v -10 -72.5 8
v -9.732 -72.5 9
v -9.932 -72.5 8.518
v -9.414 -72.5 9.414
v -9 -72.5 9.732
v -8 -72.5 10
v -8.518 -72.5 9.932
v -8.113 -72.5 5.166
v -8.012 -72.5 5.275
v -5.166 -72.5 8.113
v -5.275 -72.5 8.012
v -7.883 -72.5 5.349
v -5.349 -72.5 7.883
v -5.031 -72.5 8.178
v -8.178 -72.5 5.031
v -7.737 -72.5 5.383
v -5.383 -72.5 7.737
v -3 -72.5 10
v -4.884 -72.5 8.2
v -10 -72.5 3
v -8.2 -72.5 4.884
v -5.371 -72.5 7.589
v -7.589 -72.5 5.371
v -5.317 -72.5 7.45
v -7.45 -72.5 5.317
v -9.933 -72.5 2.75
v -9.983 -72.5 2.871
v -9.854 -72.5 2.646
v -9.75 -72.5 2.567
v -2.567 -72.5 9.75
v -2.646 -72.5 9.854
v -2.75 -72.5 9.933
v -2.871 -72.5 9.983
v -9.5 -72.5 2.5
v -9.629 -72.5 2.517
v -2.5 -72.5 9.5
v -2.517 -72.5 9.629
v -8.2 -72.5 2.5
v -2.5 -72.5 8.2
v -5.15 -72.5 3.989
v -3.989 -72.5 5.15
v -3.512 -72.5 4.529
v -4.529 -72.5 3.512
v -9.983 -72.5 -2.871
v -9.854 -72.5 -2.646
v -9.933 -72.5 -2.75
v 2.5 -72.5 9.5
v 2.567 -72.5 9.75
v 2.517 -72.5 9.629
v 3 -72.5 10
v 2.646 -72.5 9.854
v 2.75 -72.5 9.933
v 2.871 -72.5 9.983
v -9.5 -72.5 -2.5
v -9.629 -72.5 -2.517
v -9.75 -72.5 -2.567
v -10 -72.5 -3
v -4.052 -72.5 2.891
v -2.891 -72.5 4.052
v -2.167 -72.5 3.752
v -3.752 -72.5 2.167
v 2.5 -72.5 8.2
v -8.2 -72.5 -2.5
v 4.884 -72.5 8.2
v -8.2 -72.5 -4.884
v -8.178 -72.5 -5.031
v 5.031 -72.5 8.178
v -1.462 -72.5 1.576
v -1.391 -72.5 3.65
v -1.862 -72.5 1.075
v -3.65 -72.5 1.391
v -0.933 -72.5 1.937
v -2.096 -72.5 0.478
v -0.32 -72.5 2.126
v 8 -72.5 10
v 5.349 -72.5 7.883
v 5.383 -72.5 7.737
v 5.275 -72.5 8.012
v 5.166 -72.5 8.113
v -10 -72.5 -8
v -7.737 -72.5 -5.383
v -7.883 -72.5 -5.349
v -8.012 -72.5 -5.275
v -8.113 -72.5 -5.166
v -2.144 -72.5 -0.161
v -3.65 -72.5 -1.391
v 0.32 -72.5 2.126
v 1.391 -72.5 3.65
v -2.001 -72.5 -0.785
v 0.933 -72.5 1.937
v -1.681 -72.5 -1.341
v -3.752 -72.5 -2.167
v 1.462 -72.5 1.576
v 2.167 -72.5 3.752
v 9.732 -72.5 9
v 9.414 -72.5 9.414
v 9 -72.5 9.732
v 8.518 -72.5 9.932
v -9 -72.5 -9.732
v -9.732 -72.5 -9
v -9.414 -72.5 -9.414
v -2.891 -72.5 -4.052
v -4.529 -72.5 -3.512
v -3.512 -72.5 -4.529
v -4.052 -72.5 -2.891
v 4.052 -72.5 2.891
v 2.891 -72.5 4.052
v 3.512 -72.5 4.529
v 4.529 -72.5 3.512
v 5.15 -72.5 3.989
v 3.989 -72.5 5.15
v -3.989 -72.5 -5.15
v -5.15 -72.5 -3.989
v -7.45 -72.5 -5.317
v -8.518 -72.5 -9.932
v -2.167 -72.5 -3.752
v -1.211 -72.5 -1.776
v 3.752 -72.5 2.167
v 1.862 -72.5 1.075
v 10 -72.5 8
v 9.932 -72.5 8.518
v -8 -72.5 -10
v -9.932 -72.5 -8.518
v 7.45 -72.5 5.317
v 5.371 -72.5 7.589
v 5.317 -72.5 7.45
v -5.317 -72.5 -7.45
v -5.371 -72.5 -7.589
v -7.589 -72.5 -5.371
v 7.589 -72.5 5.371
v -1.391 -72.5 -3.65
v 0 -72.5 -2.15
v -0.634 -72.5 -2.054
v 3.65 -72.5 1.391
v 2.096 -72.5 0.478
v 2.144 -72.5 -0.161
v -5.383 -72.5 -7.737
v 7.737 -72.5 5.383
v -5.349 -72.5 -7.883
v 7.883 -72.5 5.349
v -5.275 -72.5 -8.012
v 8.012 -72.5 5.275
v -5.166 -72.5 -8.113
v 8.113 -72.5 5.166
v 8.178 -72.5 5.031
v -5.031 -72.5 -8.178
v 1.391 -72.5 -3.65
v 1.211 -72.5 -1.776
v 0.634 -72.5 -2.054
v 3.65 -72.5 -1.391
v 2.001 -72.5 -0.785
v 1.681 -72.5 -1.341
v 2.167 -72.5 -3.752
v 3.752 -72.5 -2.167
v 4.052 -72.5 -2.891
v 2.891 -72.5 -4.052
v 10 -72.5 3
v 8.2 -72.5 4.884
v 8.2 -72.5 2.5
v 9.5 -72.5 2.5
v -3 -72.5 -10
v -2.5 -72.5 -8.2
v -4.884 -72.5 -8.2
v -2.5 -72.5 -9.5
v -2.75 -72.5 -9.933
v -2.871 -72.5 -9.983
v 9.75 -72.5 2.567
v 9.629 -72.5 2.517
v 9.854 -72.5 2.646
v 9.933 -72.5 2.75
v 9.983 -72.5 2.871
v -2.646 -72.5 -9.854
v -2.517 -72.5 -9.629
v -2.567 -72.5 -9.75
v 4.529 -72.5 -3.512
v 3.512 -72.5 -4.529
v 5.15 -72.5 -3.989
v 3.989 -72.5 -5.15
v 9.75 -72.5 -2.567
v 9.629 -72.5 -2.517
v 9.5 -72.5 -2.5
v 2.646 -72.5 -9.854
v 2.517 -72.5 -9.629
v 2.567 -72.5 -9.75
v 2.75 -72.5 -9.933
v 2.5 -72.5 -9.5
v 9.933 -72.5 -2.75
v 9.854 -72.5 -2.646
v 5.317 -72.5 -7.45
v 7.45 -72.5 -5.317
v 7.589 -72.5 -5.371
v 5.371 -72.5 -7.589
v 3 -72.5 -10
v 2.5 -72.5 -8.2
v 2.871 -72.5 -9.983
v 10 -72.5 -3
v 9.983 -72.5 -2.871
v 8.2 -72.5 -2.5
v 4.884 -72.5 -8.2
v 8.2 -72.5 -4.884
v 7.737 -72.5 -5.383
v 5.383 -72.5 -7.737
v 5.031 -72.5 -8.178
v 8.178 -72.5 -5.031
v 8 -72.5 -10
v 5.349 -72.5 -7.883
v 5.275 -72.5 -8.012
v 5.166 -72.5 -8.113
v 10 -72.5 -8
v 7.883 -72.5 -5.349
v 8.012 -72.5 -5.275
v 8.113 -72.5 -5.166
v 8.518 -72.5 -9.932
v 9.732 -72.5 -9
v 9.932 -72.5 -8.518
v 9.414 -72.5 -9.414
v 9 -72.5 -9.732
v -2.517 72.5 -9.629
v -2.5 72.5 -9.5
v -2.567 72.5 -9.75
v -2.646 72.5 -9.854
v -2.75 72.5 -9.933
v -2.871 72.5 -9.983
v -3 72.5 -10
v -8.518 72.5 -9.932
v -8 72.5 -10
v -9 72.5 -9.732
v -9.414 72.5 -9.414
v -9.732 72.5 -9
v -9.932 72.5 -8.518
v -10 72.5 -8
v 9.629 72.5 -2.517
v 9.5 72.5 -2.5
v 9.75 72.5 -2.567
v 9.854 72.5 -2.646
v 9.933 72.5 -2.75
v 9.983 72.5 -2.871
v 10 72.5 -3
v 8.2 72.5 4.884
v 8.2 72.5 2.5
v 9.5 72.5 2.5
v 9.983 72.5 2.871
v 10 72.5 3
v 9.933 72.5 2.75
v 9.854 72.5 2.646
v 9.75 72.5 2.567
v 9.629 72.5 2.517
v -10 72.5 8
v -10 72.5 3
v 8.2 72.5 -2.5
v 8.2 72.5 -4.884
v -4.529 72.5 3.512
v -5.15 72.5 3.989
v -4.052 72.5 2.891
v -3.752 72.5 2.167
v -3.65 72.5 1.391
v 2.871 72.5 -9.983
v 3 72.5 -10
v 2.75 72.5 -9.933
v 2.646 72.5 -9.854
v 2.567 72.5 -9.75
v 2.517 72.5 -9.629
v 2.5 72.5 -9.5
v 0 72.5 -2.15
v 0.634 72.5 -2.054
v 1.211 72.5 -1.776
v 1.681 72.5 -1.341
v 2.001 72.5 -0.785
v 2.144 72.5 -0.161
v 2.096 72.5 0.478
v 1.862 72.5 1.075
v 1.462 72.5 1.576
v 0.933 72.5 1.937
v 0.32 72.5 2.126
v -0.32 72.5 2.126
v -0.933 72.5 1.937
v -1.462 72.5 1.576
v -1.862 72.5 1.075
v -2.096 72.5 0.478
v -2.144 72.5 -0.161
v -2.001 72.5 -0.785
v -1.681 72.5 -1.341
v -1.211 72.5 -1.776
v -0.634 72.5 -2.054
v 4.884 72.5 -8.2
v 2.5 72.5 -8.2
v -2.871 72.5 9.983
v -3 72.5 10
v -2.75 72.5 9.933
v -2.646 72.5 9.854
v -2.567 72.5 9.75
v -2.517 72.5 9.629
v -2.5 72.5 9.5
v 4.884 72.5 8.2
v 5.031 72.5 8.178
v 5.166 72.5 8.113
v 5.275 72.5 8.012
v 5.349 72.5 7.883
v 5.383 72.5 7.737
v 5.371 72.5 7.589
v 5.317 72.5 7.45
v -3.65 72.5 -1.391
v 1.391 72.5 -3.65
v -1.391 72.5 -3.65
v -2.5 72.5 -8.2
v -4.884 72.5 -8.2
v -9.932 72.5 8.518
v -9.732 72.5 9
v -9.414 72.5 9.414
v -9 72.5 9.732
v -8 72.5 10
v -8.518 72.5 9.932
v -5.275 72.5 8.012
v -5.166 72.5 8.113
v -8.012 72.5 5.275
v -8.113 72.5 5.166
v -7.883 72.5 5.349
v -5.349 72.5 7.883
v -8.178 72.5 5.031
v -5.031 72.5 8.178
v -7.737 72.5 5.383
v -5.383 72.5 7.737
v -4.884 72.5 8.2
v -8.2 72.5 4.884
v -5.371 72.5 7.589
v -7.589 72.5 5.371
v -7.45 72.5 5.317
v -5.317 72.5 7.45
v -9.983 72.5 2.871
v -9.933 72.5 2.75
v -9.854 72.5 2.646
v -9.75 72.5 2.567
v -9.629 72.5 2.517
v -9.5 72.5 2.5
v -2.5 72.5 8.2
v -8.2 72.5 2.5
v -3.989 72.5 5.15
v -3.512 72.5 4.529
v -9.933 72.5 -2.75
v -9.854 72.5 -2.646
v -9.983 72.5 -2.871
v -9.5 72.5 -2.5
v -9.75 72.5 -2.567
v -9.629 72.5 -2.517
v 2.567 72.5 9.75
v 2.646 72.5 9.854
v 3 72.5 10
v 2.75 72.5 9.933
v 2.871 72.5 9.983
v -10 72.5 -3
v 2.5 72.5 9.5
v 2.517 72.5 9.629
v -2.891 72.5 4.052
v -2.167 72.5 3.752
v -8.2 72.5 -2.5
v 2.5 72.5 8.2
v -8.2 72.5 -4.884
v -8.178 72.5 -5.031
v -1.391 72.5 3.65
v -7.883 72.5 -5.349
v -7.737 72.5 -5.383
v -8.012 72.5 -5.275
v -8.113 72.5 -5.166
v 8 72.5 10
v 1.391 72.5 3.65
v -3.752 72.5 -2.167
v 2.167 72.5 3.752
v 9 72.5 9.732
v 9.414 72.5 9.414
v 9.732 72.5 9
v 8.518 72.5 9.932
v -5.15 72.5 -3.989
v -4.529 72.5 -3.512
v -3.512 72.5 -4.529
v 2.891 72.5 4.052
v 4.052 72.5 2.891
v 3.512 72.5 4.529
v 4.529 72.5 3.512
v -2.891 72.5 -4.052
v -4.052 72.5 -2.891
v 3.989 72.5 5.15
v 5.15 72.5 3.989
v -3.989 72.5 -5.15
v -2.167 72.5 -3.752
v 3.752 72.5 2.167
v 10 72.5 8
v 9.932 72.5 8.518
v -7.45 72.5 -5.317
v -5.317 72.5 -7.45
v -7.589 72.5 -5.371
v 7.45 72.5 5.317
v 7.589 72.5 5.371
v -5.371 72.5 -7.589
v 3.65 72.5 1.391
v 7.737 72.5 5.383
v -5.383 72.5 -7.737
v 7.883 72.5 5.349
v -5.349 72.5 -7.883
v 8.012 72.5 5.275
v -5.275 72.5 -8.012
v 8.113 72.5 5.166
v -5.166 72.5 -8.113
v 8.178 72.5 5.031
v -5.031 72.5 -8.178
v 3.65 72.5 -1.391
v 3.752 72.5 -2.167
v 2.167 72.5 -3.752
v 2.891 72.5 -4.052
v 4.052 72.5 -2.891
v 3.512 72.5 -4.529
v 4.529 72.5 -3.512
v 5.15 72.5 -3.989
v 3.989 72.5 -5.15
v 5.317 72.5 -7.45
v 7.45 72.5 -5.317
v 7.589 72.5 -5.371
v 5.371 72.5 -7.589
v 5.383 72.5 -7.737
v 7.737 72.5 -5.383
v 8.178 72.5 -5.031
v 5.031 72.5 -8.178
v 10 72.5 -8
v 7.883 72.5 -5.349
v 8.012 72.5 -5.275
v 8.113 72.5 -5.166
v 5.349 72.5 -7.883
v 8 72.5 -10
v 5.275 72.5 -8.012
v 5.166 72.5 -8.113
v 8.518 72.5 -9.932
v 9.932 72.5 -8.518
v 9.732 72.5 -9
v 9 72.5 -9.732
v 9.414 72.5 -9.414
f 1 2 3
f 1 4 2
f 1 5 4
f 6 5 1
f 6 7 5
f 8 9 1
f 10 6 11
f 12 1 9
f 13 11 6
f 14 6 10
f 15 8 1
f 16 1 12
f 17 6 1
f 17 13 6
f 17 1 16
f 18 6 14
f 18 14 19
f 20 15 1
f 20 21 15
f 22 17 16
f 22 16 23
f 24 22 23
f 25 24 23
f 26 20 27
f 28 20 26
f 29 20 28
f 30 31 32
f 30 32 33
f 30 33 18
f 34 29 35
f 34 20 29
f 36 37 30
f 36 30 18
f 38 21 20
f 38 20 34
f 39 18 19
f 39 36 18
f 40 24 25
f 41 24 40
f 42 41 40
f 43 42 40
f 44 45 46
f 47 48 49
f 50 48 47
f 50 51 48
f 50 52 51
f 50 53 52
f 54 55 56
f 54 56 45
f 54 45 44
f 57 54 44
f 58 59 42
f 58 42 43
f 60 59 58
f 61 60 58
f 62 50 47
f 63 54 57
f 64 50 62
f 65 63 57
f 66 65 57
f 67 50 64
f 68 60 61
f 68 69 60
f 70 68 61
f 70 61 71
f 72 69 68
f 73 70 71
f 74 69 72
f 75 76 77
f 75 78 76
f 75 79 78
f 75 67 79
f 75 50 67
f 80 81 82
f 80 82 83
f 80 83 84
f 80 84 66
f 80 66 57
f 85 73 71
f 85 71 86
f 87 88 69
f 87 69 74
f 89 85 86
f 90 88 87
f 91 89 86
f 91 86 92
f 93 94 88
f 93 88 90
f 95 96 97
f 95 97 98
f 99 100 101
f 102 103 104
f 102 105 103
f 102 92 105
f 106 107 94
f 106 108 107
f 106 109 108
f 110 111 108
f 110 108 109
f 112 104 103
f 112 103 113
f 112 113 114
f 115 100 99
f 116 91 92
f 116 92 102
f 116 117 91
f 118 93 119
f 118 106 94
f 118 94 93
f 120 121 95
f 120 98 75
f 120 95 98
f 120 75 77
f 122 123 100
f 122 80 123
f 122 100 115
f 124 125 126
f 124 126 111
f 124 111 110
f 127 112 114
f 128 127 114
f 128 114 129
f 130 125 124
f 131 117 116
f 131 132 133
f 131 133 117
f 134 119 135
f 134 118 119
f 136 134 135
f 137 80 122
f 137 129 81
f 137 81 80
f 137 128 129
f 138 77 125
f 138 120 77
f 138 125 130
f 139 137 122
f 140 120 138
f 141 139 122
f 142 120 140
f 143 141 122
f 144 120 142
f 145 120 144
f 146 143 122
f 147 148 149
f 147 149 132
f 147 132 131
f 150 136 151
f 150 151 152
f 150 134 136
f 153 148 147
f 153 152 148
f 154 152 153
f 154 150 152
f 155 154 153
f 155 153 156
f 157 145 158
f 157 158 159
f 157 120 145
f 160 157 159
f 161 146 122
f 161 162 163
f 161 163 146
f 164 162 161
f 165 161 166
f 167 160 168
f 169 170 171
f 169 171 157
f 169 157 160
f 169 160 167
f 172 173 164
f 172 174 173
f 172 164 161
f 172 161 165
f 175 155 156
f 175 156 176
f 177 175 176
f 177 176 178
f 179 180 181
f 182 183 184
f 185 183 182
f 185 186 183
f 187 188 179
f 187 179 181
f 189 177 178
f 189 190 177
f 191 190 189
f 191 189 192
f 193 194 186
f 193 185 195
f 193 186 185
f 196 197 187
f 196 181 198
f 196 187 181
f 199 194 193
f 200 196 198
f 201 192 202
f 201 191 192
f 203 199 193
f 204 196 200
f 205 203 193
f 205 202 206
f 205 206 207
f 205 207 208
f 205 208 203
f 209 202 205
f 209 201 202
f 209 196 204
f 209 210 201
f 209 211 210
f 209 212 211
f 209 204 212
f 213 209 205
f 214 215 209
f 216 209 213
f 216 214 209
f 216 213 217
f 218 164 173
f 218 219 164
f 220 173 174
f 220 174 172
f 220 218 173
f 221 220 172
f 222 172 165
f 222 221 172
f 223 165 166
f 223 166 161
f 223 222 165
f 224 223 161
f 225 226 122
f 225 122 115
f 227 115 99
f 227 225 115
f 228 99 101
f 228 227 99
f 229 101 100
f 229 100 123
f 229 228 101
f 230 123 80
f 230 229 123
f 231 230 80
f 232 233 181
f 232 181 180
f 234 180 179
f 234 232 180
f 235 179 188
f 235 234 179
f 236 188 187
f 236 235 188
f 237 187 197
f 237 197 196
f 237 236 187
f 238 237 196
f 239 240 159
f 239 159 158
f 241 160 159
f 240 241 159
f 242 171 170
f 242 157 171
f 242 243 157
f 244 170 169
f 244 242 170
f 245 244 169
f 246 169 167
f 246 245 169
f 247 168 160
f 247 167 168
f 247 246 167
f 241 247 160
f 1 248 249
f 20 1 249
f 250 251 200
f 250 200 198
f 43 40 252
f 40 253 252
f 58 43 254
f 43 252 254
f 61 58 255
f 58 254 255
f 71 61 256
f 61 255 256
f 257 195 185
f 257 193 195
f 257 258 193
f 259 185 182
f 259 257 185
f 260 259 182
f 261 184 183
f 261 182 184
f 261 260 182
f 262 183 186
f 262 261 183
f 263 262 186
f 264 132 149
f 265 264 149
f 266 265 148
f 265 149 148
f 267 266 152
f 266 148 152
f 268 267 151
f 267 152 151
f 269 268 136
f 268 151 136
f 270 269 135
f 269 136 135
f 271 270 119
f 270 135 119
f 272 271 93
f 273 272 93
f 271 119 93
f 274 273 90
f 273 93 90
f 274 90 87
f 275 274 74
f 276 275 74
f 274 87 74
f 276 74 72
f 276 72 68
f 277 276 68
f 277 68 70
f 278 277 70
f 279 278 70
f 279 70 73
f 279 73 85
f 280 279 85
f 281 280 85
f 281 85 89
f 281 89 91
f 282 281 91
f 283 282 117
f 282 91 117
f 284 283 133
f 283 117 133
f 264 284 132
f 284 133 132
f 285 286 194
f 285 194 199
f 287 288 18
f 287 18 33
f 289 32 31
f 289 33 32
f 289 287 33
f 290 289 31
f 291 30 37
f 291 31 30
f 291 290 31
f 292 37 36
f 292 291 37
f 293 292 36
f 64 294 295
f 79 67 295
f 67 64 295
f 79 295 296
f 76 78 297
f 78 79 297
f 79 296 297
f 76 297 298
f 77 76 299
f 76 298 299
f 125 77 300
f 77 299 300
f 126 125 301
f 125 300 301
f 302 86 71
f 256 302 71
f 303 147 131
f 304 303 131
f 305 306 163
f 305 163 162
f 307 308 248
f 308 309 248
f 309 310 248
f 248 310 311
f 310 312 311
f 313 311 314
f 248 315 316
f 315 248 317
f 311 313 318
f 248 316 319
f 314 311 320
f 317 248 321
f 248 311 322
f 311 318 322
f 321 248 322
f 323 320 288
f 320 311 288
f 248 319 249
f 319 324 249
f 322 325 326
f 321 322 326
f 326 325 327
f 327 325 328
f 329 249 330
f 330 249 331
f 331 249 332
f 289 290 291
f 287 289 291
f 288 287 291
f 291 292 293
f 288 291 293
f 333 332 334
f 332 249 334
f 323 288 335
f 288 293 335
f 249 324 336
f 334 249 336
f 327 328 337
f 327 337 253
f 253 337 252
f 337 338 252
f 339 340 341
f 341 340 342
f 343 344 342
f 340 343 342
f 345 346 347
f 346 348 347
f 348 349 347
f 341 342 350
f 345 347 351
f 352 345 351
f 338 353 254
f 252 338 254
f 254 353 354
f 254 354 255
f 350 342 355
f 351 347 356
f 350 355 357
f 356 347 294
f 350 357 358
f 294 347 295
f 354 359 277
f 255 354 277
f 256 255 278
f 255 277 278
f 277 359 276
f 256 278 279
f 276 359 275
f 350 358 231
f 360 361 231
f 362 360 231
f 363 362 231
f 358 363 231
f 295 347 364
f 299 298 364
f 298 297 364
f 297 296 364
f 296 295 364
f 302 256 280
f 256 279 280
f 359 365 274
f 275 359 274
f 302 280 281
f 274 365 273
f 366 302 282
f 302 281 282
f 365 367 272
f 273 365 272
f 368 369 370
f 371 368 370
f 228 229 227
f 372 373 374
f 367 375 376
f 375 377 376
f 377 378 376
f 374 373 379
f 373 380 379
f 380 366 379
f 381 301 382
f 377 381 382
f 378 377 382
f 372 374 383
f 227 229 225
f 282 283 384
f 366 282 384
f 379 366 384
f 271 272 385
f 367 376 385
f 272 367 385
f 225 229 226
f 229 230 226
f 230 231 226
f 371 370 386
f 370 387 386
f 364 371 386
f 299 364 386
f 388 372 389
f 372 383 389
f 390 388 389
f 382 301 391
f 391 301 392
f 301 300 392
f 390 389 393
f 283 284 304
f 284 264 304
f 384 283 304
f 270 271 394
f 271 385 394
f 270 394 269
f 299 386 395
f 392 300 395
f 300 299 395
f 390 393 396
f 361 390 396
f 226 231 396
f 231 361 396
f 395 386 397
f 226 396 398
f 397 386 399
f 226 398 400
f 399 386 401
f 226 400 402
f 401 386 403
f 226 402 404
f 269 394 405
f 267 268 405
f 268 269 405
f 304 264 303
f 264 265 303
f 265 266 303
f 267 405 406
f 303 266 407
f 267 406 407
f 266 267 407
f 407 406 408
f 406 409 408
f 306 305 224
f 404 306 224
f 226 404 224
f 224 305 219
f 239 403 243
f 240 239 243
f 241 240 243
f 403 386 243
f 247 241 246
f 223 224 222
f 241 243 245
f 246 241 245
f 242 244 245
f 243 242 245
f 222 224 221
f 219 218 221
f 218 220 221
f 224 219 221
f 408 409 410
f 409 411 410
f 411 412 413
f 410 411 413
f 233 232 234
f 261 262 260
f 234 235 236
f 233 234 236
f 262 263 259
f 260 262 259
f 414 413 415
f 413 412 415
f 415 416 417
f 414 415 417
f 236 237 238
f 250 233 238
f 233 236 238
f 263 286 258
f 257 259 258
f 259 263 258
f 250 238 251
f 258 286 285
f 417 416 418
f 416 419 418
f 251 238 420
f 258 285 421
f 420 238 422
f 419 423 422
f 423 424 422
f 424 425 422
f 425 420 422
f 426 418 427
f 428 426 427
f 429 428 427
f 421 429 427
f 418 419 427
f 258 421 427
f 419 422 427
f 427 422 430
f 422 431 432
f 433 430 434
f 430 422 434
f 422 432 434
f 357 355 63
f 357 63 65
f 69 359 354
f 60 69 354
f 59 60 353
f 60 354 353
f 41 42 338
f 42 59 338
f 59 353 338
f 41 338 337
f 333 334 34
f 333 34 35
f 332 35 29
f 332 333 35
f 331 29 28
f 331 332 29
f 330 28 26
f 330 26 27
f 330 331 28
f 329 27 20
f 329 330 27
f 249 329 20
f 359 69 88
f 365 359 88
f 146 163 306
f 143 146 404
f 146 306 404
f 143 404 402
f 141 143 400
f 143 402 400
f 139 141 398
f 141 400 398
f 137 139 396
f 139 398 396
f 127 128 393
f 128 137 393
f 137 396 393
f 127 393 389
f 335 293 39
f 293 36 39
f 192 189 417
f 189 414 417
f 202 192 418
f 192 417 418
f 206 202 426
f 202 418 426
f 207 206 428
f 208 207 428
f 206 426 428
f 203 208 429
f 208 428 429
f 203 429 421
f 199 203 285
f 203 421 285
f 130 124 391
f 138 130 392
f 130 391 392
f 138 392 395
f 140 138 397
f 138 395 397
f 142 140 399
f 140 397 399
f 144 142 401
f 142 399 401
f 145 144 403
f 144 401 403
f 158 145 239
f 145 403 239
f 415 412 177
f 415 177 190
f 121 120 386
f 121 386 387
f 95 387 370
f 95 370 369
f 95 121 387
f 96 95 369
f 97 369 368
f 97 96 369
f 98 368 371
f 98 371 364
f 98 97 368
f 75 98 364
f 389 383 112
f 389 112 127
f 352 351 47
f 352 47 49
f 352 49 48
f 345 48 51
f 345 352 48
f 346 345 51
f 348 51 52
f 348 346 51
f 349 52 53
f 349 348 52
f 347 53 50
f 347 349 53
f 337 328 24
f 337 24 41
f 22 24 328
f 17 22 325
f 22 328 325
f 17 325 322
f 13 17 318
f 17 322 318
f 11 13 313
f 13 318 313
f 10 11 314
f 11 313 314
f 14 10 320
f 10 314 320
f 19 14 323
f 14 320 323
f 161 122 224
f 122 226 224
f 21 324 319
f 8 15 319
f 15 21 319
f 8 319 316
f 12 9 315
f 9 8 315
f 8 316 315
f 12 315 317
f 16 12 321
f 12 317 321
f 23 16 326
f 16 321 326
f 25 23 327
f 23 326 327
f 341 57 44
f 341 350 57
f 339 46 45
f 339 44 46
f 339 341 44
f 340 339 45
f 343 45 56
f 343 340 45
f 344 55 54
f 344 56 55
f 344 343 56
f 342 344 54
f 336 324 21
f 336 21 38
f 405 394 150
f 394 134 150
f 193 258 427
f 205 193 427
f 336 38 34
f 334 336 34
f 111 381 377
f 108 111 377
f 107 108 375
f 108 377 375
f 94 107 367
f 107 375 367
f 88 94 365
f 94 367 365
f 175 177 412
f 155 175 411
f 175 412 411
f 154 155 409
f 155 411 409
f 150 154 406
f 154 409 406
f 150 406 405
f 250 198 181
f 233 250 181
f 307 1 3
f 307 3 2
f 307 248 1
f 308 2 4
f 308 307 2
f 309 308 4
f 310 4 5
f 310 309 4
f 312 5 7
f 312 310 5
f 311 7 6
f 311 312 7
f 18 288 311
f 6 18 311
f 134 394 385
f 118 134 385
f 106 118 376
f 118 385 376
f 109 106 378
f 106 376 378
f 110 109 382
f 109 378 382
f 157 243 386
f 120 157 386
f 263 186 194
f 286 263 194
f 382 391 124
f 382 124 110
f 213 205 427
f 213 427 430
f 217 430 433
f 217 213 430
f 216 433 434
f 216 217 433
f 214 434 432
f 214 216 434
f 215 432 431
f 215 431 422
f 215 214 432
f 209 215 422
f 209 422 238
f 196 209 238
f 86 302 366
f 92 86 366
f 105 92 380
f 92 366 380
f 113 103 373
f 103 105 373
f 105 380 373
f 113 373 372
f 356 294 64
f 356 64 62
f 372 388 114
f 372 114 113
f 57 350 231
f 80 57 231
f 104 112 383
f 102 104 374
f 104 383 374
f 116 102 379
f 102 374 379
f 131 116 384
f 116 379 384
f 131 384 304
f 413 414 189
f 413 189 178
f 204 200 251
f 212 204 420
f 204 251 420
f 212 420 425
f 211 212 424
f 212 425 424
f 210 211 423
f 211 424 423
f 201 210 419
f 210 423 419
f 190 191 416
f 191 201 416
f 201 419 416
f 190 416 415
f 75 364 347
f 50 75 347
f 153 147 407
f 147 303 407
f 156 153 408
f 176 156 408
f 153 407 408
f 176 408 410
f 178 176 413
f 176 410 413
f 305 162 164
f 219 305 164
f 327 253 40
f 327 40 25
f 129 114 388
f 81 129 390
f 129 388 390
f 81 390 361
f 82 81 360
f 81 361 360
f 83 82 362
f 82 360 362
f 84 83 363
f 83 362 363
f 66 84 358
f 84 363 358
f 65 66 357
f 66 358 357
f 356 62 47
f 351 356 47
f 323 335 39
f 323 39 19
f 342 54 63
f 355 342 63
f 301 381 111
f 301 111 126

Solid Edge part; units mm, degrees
sketch "Sketch1" plane through (0, 0, 0) normal (0, -1, 0) x (1, 0, 0)
  line L0 (-10, -10) -> (10, -10)
  line L1 (10, -10) -> (10, 10)
  line L2 (10, 10) -> (-10, 10)
  line L3 (-10, 10) -> (-10, -10)
  dimension "D1" = 20
  dimension "D2" = 20
extrude "Protrusion1" add sketch "Sketch1" along normal mid plane 145
sketch "Sketch2" plane through (0, -72.5, 0) normal (0, -1, 0) x (1, 0, 0)
  line L0 (-2.5, 10) -> (-2.5, 8.2)
  line L1 (-2.5, 8.2) -> (-5.75, 8.2)
  line L2 (-5.75, 8.2) -> (-3.1231, 3.65)
  line L3 (-3.1231, 3.65) -> (3.1231, 3.65)
  line L4 (3.1231, 3.65) -> (5.75, 8.2)
  line L5 (5.75, 8.2) -> (2.5, 8.2)
  line L6 (2.5, 8.2) -> (2.5, 10)
  line L7 (2.5, 10) -> (-2.5, 10)
  dimension "D1" = 11.5
  dimension "D2" = 1.8
  dimension "D3" = 5
  dimension "D4" = 6.35
extrude "Cutout1" cut sketch "Sketch2" against normal through all
fillet "Verrundung_1" radius 2 4 edges at (10, 0, 10) (-10, 0, 10) (10, 0, -10) (-10, 0, -10)
fillet "Verrundung_2" radius 3 2 edges at (-3.1231, 0, 3.65) (3.1231, 0, 3.65)
fillet "Verrundung_3" radius 0.5 4 edges at (-5.75, 0, 8.2) (5.75, 0, 8.2) (-2.5, 0, 10) (2.5, 0, 10)
hole "Bohrung_1" at (0, -72.5, 0) direction (0, 1, 0) diameter 4.3 end up to next
pattern_circular "Pattern1" count 4 over 360 about axis through (0, -72.5, 0) along (0, -1, 0) of "Cutout1"
fillet "Round1" radius 3 2 edges at (-3.65, 0, -3.1231) (-3.65, 0, 3.1231)
fillet "Round2" radius 0.5 4 edges at (-8.2, 0, -5.75) (-8.2, 0, 5.75) (-10, 0, -2.5) (-10, 0, 2.5)
fillet "Round3" radius 3 2 edges at (3.1231, 0, -3.65) (-3.1231, 0, -3.65)
fillet "Round4" radius 0.5 4 edges at (5.75, 0, -8.2) (-5.75, 0, -8.2) (2.5, 0, -10) (-2.5, 0, -10)
fillet "Round5" radius 3 2 edges at (3.65, 0, 3.1231) (3.65, 0, -3.1231)
fillet "Round6" radius 0.5 4 edges at (8.2, 0, 5.75) (8.2, 0, -5.75) (10, 0, 2.5) (10, 0, -2.5)
